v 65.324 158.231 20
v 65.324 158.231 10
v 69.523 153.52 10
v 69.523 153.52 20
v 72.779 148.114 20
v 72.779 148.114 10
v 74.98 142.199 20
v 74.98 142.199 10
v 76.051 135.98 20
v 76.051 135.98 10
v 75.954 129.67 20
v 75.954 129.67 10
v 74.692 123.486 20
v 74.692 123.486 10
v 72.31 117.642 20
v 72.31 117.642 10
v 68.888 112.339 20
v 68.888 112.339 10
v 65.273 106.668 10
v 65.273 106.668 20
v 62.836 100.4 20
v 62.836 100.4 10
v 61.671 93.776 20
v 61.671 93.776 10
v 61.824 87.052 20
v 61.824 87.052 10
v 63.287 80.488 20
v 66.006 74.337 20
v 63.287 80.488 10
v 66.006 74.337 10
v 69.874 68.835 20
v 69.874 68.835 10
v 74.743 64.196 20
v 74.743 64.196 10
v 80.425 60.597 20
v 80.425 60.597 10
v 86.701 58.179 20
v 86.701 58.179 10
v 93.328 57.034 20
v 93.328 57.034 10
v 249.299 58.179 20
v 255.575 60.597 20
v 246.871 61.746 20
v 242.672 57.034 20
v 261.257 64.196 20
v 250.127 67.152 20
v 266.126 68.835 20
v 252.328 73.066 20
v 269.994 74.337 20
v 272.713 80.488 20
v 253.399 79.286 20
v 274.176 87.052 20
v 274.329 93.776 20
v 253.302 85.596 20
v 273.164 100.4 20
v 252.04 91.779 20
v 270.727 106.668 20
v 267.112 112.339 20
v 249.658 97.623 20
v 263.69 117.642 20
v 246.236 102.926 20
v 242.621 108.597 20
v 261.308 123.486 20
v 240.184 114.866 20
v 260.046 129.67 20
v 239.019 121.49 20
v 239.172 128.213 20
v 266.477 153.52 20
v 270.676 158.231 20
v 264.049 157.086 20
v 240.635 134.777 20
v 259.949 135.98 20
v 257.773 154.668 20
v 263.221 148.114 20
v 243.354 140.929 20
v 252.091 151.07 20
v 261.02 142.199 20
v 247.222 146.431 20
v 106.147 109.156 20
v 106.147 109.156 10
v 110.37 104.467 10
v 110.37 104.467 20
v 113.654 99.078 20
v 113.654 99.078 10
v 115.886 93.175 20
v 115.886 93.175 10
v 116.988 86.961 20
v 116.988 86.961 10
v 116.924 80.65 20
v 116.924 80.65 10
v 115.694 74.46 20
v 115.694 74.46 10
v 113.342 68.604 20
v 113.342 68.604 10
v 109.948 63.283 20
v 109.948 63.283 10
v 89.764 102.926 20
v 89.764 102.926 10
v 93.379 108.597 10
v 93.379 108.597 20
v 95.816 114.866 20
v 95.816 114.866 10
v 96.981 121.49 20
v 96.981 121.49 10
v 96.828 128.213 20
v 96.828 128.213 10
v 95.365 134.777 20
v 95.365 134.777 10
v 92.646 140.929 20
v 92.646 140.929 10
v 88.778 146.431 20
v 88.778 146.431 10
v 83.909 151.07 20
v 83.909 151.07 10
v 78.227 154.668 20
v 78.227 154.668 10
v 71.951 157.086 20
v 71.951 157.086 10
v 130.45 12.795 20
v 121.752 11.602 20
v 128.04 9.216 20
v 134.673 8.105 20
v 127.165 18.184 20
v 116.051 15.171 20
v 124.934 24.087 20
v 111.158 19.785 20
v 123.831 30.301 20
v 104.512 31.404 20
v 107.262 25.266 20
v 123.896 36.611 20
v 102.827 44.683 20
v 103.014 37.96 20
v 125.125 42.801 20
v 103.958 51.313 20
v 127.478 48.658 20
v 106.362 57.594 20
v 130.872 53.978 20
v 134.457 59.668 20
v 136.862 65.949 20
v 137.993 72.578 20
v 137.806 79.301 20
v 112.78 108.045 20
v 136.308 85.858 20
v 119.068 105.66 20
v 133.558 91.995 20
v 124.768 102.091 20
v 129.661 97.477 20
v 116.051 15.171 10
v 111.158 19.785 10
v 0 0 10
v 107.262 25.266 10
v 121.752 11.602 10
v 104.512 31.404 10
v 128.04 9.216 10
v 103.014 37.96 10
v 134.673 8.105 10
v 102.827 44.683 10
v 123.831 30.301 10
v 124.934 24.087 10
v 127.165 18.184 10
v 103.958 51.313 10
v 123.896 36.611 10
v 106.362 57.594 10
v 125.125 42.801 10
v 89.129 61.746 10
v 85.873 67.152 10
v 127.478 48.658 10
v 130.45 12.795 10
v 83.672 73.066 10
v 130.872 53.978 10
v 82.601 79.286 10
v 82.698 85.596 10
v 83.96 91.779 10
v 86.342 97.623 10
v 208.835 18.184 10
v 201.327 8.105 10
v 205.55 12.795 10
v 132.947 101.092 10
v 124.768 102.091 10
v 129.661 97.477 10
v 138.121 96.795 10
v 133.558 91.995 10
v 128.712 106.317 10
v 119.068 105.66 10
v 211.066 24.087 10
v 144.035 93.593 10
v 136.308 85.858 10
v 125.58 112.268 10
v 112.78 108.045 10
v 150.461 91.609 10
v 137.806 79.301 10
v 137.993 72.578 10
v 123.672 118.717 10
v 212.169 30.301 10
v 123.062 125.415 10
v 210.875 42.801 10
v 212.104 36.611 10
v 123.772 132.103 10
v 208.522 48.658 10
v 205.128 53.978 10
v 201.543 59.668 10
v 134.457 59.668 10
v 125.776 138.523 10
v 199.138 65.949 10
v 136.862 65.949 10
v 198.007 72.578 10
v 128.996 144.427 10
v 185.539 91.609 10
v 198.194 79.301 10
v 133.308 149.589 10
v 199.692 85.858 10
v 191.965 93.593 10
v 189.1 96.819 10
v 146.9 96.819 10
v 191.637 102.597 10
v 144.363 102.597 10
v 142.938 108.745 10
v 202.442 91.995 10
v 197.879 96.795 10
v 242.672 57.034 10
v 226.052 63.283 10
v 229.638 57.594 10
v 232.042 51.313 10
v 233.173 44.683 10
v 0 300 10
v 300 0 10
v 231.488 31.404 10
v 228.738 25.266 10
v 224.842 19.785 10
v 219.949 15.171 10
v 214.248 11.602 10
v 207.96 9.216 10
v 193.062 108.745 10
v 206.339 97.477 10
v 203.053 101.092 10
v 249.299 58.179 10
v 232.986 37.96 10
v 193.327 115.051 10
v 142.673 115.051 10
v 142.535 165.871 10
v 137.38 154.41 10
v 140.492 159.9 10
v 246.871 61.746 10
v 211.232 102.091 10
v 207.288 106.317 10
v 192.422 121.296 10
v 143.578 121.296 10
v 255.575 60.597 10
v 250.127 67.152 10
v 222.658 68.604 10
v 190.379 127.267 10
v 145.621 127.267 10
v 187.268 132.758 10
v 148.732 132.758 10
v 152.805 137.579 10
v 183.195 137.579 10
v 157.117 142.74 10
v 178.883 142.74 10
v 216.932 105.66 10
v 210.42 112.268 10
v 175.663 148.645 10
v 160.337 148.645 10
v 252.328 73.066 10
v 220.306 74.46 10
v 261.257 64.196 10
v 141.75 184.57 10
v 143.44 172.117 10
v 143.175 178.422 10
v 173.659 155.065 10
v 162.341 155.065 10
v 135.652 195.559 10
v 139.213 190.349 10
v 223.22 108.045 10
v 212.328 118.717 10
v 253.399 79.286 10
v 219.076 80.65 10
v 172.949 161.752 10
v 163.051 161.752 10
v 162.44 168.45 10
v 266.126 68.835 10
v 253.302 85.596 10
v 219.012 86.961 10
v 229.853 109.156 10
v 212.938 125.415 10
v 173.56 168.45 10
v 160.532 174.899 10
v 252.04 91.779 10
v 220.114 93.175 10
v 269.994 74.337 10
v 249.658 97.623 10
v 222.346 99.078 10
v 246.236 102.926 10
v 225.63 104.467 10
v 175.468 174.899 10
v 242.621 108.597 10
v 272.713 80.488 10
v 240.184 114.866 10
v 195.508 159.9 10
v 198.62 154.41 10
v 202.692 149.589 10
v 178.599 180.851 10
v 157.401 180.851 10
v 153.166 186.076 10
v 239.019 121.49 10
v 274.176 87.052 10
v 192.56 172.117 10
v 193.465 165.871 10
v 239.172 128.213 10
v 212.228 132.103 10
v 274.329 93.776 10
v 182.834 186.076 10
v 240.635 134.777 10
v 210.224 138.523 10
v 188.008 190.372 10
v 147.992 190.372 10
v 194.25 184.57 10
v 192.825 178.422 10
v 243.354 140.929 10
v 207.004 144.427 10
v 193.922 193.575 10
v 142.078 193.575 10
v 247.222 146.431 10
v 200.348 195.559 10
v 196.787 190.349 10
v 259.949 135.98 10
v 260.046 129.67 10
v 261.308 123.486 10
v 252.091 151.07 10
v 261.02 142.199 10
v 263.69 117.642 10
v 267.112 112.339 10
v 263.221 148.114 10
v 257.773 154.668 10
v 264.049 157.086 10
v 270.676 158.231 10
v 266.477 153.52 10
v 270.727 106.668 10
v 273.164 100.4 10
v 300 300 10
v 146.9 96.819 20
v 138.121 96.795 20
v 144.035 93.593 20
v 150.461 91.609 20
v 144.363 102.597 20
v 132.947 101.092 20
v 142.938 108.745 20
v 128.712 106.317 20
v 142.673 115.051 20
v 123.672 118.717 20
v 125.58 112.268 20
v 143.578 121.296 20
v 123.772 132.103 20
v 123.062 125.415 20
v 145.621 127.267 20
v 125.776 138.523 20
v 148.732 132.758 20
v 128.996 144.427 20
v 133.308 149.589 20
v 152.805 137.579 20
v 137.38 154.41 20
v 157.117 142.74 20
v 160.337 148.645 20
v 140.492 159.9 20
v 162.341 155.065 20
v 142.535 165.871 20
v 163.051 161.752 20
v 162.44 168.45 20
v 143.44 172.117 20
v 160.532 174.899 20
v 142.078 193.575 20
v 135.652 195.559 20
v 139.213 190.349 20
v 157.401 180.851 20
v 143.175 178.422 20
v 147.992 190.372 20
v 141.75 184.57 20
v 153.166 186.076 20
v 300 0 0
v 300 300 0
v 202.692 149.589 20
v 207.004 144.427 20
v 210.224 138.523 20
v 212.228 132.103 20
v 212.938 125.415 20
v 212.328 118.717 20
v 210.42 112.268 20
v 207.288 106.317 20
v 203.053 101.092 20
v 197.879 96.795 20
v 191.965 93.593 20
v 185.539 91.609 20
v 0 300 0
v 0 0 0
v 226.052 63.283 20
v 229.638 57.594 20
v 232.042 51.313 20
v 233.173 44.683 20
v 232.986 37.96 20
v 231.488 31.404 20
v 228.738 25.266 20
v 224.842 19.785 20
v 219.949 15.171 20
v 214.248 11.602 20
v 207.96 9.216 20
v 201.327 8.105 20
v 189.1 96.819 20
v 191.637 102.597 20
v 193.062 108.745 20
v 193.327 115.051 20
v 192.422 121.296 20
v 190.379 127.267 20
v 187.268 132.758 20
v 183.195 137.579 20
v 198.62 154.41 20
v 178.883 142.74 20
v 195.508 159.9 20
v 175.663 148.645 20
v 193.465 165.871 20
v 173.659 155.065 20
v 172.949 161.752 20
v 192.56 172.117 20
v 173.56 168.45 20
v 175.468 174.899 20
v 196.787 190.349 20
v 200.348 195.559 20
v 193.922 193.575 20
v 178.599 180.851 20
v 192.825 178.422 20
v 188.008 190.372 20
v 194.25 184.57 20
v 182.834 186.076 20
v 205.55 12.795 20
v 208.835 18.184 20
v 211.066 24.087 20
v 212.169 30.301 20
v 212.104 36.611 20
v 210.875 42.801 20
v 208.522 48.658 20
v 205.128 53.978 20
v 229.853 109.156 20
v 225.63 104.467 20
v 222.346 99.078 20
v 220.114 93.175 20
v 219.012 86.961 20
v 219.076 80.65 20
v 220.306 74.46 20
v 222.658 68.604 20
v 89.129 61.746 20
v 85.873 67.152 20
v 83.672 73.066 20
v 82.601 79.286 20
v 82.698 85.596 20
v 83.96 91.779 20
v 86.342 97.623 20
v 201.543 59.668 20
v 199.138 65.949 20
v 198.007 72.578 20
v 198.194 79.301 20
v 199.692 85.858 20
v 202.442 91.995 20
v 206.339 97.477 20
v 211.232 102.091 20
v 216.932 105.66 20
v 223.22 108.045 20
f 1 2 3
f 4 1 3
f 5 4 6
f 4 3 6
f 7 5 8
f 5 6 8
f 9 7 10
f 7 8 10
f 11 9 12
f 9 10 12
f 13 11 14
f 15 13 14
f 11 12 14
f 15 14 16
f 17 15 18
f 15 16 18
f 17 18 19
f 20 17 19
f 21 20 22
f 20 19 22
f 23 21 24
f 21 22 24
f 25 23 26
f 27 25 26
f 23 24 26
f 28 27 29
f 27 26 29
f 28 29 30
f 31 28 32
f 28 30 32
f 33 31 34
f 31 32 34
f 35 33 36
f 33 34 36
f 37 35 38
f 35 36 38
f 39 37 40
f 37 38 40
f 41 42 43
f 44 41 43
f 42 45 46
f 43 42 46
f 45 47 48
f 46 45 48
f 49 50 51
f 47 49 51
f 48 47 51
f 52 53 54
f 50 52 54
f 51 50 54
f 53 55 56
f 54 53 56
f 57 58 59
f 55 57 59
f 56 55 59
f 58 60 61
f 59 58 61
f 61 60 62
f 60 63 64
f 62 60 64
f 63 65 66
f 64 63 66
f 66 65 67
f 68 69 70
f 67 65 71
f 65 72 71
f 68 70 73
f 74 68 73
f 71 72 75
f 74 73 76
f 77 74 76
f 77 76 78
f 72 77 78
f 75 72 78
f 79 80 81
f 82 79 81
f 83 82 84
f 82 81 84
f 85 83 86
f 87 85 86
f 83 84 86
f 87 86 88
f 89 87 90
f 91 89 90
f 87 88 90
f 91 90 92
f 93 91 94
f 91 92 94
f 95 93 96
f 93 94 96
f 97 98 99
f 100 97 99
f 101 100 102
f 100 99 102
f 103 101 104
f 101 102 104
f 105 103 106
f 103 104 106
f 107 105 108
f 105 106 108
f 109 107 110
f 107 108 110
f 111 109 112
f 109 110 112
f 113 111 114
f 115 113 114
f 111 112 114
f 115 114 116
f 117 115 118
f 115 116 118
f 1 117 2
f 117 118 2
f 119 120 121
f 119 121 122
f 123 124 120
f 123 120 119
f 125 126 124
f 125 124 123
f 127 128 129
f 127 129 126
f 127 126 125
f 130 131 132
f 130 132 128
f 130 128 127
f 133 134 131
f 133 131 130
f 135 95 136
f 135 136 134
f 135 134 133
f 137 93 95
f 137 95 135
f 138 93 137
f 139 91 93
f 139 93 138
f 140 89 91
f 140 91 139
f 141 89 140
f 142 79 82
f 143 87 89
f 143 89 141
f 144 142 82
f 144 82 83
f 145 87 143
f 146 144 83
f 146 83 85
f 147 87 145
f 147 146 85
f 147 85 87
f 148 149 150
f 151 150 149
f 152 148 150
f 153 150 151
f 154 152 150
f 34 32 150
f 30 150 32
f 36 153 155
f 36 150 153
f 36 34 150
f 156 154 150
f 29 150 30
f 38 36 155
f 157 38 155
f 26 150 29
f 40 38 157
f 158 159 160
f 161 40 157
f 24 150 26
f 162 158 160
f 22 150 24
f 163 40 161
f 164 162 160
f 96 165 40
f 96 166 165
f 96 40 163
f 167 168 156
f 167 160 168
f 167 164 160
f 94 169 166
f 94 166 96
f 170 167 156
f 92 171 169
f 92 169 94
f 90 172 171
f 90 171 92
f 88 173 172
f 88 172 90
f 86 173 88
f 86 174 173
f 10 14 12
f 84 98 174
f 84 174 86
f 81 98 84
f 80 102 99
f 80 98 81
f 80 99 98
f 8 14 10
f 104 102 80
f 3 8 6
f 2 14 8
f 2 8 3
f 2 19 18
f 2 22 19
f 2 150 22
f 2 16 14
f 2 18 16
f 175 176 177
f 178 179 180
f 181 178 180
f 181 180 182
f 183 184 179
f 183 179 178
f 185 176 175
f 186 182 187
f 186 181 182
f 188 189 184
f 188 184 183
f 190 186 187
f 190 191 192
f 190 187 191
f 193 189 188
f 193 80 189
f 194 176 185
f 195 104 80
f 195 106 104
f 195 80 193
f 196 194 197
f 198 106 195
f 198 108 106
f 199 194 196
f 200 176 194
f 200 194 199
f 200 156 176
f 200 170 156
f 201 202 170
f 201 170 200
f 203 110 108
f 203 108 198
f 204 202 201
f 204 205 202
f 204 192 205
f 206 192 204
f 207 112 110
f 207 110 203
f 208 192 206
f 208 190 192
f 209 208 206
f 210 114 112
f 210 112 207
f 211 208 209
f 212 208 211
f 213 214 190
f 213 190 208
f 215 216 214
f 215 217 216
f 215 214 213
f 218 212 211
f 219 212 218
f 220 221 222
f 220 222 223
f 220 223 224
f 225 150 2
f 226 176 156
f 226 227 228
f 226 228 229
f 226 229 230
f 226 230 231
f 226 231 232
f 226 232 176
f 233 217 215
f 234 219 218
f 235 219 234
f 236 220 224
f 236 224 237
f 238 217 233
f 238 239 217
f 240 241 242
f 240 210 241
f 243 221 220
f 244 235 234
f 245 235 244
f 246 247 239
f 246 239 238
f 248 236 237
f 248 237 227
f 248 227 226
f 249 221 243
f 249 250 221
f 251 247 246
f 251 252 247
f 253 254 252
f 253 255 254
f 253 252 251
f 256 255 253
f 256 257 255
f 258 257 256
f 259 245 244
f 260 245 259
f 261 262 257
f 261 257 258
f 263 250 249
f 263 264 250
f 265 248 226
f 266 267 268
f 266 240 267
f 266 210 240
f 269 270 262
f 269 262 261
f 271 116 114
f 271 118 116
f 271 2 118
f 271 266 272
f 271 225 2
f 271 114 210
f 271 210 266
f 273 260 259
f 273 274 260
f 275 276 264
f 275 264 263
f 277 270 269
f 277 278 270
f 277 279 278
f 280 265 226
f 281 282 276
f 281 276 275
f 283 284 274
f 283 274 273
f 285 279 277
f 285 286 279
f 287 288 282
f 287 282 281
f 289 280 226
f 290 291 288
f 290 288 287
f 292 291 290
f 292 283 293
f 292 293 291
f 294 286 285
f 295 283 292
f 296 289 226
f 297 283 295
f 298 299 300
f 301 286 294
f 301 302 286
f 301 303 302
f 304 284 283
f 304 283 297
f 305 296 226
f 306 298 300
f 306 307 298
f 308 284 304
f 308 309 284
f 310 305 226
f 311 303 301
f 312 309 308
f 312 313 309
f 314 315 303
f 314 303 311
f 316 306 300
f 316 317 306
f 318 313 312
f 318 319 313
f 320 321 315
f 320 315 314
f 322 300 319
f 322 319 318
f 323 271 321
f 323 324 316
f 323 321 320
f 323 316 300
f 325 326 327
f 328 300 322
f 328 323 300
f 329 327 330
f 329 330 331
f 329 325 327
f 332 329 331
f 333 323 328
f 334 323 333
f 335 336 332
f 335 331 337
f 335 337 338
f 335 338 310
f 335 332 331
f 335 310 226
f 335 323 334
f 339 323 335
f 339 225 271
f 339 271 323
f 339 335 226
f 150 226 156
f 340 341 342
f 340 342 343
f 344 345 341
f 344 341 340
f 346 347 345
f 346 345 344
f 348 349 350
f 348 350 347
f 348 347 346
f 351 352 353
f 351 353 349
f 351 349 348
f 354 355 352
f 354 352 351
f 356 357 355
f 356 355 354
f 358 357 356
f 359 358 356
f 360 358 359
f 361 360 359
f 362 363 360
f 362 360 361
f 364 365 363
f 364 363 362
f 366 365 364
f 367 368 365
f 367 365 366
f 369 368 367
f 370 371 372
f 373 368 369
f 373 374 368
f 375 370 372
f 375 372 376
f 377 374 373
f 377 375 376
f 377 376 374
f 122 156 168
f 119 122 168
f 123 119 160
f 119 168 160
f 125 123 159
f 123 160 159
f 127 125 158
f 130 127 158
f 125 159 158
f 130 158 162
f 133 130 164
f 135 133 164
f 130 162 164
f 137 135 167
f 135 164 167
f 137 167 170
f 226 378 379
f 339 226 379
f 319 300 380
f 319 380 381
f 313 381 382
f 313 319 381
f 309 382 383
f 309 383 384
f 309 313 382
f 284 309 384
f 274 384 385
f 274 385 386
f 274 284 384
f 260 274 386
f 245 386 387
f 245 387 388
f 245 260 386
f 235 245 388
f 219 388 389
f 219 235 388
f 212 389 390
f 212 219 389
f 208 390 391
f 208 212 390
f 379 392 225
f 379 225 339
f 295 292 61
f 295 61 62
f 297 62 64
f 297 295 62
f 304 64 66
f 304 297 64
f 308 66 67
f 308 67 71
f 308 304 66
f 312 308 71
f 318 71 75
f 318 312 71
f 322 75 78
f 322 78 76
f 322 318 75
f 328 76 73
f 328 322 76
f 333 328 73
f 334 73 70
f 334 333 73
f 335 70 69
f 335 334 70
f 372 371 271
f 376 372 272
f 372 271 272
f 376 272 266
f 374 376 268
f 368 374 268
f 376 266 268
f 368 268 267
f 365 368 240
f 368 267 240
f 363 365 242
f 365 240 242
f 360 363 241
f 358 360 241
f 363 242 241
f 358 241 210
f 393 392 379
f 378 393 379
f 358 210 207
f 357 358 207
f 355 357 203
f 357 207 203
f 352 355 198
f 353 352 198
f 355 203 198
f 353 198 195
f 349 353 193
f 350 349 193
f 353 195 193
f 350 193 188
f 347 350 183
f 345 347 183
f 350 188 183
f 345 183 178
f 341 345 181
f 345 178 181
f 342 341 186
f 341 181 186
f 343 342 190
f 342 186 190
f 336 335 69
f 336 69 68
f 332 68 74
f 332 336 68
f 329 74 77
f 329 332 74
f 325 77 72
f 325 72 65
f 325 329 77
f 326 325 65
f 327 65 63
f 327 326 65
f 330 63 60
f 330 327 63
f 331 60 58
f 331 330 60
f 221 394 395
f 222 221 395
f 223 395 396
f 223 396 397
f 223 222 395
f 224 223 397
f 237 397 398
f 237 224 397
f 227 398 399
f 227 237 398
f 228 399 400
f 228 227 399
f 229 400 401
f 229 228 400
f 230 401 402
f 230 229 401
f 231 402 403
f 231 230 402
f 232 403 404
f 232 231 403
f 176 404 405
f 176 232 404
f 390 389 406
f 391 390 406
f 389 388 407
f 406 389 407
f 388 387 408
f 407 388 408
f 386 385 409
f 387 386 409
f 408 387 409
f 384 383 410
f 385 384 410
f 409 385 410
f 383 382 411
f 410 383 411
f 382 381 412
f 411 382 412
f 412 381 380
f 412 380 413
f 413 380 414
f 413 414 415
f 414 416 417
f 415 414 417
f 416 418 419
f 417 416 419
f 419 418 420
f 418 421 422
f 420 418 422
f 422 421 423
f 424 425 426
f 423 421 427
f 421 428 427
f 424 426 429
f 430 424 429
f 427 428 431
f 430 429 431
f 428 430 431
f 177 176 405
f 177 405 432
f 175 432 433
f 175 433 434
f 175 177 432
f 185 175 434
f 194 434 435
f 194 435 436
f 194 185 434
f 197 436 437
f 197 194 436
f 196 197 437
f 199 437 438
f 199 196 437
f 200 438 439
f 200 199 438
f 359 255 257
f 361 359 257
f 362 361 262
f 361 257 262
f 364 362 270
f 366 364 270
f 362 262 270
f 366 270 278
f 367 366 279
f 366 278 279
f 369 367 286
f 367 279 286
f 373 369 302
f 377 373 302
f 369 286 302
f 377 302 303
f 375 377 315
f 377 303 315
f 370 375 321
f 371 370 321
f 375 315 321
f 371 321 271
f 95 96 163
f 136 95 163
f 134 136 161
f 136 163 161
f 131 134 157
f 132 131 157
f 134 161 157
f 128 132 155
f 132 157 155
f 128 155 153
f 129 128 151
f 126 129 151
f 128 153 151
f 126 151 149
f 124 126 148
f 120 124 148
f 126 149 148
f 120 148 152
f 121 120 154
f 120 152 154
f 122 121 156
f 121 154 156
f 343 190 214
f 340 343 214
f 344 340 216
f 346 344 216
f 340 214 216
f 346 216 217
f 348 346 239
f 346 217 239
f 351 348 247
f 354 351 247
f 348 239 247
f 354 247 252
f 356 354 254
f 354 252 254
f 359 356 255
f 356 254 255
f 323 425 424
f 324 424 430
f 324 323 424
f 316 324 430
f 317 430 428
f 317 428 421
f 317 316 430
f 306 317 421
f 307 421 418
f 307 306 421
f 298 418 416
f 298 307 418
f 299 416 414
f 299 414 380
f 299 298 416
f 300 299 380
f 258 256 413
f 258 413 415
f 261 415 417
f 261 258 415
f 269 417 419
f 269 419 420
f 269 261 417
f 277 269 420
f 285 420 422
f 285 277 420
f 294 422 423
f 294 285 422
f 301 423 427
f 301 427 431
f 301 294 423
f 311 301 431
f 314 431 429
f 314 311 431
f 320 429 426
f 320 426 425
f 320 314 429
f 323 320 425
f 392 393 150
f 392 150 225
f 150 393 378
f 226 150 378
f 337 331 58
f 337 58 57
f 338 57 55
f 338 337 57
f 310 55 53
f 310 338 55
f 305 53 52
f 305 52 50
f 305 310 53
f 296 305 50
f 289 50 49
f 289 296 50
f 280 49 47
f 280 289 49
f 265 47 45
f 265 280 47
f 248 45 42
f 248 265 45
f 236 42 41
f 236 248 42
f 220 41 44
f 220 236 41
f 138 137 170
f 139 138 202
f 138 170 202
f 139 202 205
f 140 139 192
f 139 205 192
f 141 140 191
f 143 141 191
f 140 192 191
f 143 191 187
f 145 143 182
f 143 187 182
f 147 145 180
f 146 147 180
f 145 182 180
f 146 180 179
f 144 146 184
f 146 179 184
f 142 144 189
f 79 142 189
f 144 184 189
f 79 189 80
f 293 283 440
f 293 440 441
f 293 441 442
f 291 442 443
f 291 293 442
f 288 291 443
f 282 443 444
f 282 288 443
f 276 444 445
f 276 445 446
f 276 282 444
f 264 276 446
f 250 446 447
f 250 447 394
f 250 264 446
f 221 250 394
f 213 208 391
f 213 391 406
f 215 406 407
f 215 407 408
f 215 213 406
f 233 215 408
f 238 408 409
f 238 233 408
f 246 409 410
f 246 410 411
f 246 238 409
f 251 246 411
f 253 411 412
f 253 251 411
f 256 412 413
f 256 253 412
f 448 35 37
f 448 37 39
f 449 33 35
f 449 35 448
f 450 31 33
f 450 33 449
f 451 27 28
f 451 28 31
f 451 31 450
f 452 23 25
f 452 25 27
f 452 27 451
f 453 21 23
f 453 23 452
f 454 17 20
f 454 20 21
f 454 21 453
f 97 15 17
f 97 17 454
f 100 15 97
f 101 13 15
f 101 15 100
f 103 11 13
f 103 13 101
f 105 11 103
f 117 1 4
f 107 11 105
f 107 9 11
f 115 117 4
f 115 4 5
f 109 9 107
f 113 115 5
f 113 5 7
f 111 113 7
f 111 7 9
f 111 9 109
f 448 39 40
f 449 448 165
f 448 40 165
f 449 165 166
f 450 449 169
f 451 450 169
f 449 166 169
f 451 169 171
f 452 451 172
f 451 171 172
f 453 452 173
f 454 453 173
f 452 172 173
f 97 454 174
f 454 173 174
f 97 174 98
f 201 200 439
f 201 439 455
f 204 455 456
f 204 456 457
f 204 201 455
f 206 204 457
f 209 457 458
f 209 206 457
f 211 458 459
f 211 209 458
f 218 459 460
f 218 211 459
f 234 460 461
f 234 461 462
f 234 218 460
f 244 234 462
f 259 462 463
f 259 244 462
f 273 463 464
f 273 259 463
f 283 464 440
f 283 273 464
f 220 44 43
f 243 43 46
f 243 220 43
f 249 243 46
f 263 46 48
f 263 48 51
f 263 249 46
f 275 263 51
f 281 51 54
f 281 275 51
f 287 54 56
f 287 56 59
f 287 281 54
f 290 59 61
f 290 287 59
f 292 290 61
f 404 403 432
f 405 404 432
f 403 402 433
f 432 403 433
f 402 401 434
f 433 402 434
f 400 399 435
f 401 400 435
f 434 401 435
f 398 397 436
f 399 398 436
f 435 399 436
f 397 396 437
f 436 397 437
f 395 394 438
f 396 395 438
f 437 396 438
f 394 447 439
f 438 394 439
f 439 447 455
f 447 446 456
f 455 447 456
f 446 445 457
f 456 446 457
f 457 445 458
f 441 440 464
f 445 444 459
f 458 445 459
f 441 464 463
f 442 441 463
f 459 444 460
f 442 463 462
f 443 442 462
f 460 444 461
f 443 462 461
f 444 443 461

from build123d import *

# Parameters (mm, degrees)
SKICA1_W                = 300
SKICA1_H                = 300
P_IDAT_VYSUNUT_M1_DEPTH = 10
P_IDAT_VYSUNUT_M3_DEPTH = 10


with BuildPart() as part:
    # Skica1 → Přidat vysunutím1 (new body)
    with BuildSketch(Plane.XY):
        with Locations((150, 150)):
            Rectangle(SKICA1_W, SKICA1_H)
    extrude(amount=P_IDAT_VYSUNUT_M1_DEPTH)

    # Skica3 → Přidat vysunutím3 (add)
    with BuildSketch(Plane.XY.offset(10)):
        with BuildLine():
            ThreePointArc((68.888397272, 112.33931183), (64.495171116, 77.345400758), (93.328139617, 57.034463419))
            ThreePointArc((93.328139617, 57.034463419), (82.601051267, 79.285579191), (89.763558517, 102.926244737))
            ThreePointArc((89.763558517, 102.926244737), (94.156784672, 137.920155809), (65.323816172, 158.231093148))
            ThreePointArc((65.323816172, 158.231093148), (76.050904522, 135.979977376), (68.888397272, 112.33931183))
        make_face()
        with BuildLine():
            ThreePointArc((109.948101695, 63.283359984), (105.735567111, 28.267237976), (134.672993338, 8.105402458))
            ThreePointArc((134.672993338, 8.105402458), (123.831191153, 30.300850255), (130.871573598, 53.978172582))
            ThreePointArc((130.871573598, 53.978172582), (135.084108182, 88.994294591), (106.146681955, 109.156130109))
            ThreePointArc((106.146681955, 109.156130109), (116.98848414, 86.960682312), (109.948101695, 63.283359984))
        make_face()
        with BuildLine():
            ThreePointArc((133.307752162, 149.58869496), (124.467578103, 115.44597142), (150.460873085, 91.608545718))
            ThreePointArc((150.460873085, 91.608545718), (142.672820518, 115.050576661), (152.804965779, 137.578830254))
            ThreePointArc((152.804965779, 137.578830254), (161.645139837, 171.721553795), (135.651844855, 195.558979497))
            ThreePointArc((135.651844855, 195.558979497), (143.439897423, 172.116948553), (133.307752162, 149.58869496))
        make_face()
        with BuildLine():
            ThreePointArc((246.236441483, 102.926244737), (241.843215328, 137.920155809), (270.676183828, 158.231093148))
            ThreePointArc((270.676183828, 158.231093148), (259.949095478, 135.979977376), (267.111602728, 112.33931183))
            ThreePointArc((267.111602728, 112.33931183), (271.504828884, 77.345400758), (242.671860383, 57.034463419))
            ThreePointArc((242.671860383, 57.034463419), (253.398948733, 79.285579191), (246.236441483, 102.926244737))
        make_face()
        with BuildLine():
            ThreePointArc((226.051898305, 63.283359984), (230.264432889, 28.267237976), (201.327006662, 8.105402458))
            ThreePointArc((201.327006662, 8.105402458), (212.168808847, 30.300850255), (205.128426402, 53.978172582))
            ThreePointArc((205.128426402, 53.978172582), (200.915891818, 88.994294591), (229.853318045, 109.156130109))
            ThreePointArc((229.853318045, 109.156130109), (219.01151586, 86.960682312), (226.051898305, 63.283359984))
        make_face()
        with BuildLine():
            ThreePointArc((202.692247838, 149.58869496), (211.532421897, 115.44597142), (185.539126915, 91.608545718))
            ThreePointArc((185.539126915, 91.608545718), (193.327179482, 115.050576661), (183.195034221, 137.578830254))
            ThreePointArc((183.195034221, 137.578830254), (174.354860163, 171.721553795), (200.348155145, 195.558979497))
            ThreePointArc((200.348155145, 195.558979497), (192.560102577, 172.116948553), (202.692247838, 149.58869496))
        make_face()
    extrude(amount=P_IDAT_VYSUNUT_M3_DEPTH)


solid = part.part
